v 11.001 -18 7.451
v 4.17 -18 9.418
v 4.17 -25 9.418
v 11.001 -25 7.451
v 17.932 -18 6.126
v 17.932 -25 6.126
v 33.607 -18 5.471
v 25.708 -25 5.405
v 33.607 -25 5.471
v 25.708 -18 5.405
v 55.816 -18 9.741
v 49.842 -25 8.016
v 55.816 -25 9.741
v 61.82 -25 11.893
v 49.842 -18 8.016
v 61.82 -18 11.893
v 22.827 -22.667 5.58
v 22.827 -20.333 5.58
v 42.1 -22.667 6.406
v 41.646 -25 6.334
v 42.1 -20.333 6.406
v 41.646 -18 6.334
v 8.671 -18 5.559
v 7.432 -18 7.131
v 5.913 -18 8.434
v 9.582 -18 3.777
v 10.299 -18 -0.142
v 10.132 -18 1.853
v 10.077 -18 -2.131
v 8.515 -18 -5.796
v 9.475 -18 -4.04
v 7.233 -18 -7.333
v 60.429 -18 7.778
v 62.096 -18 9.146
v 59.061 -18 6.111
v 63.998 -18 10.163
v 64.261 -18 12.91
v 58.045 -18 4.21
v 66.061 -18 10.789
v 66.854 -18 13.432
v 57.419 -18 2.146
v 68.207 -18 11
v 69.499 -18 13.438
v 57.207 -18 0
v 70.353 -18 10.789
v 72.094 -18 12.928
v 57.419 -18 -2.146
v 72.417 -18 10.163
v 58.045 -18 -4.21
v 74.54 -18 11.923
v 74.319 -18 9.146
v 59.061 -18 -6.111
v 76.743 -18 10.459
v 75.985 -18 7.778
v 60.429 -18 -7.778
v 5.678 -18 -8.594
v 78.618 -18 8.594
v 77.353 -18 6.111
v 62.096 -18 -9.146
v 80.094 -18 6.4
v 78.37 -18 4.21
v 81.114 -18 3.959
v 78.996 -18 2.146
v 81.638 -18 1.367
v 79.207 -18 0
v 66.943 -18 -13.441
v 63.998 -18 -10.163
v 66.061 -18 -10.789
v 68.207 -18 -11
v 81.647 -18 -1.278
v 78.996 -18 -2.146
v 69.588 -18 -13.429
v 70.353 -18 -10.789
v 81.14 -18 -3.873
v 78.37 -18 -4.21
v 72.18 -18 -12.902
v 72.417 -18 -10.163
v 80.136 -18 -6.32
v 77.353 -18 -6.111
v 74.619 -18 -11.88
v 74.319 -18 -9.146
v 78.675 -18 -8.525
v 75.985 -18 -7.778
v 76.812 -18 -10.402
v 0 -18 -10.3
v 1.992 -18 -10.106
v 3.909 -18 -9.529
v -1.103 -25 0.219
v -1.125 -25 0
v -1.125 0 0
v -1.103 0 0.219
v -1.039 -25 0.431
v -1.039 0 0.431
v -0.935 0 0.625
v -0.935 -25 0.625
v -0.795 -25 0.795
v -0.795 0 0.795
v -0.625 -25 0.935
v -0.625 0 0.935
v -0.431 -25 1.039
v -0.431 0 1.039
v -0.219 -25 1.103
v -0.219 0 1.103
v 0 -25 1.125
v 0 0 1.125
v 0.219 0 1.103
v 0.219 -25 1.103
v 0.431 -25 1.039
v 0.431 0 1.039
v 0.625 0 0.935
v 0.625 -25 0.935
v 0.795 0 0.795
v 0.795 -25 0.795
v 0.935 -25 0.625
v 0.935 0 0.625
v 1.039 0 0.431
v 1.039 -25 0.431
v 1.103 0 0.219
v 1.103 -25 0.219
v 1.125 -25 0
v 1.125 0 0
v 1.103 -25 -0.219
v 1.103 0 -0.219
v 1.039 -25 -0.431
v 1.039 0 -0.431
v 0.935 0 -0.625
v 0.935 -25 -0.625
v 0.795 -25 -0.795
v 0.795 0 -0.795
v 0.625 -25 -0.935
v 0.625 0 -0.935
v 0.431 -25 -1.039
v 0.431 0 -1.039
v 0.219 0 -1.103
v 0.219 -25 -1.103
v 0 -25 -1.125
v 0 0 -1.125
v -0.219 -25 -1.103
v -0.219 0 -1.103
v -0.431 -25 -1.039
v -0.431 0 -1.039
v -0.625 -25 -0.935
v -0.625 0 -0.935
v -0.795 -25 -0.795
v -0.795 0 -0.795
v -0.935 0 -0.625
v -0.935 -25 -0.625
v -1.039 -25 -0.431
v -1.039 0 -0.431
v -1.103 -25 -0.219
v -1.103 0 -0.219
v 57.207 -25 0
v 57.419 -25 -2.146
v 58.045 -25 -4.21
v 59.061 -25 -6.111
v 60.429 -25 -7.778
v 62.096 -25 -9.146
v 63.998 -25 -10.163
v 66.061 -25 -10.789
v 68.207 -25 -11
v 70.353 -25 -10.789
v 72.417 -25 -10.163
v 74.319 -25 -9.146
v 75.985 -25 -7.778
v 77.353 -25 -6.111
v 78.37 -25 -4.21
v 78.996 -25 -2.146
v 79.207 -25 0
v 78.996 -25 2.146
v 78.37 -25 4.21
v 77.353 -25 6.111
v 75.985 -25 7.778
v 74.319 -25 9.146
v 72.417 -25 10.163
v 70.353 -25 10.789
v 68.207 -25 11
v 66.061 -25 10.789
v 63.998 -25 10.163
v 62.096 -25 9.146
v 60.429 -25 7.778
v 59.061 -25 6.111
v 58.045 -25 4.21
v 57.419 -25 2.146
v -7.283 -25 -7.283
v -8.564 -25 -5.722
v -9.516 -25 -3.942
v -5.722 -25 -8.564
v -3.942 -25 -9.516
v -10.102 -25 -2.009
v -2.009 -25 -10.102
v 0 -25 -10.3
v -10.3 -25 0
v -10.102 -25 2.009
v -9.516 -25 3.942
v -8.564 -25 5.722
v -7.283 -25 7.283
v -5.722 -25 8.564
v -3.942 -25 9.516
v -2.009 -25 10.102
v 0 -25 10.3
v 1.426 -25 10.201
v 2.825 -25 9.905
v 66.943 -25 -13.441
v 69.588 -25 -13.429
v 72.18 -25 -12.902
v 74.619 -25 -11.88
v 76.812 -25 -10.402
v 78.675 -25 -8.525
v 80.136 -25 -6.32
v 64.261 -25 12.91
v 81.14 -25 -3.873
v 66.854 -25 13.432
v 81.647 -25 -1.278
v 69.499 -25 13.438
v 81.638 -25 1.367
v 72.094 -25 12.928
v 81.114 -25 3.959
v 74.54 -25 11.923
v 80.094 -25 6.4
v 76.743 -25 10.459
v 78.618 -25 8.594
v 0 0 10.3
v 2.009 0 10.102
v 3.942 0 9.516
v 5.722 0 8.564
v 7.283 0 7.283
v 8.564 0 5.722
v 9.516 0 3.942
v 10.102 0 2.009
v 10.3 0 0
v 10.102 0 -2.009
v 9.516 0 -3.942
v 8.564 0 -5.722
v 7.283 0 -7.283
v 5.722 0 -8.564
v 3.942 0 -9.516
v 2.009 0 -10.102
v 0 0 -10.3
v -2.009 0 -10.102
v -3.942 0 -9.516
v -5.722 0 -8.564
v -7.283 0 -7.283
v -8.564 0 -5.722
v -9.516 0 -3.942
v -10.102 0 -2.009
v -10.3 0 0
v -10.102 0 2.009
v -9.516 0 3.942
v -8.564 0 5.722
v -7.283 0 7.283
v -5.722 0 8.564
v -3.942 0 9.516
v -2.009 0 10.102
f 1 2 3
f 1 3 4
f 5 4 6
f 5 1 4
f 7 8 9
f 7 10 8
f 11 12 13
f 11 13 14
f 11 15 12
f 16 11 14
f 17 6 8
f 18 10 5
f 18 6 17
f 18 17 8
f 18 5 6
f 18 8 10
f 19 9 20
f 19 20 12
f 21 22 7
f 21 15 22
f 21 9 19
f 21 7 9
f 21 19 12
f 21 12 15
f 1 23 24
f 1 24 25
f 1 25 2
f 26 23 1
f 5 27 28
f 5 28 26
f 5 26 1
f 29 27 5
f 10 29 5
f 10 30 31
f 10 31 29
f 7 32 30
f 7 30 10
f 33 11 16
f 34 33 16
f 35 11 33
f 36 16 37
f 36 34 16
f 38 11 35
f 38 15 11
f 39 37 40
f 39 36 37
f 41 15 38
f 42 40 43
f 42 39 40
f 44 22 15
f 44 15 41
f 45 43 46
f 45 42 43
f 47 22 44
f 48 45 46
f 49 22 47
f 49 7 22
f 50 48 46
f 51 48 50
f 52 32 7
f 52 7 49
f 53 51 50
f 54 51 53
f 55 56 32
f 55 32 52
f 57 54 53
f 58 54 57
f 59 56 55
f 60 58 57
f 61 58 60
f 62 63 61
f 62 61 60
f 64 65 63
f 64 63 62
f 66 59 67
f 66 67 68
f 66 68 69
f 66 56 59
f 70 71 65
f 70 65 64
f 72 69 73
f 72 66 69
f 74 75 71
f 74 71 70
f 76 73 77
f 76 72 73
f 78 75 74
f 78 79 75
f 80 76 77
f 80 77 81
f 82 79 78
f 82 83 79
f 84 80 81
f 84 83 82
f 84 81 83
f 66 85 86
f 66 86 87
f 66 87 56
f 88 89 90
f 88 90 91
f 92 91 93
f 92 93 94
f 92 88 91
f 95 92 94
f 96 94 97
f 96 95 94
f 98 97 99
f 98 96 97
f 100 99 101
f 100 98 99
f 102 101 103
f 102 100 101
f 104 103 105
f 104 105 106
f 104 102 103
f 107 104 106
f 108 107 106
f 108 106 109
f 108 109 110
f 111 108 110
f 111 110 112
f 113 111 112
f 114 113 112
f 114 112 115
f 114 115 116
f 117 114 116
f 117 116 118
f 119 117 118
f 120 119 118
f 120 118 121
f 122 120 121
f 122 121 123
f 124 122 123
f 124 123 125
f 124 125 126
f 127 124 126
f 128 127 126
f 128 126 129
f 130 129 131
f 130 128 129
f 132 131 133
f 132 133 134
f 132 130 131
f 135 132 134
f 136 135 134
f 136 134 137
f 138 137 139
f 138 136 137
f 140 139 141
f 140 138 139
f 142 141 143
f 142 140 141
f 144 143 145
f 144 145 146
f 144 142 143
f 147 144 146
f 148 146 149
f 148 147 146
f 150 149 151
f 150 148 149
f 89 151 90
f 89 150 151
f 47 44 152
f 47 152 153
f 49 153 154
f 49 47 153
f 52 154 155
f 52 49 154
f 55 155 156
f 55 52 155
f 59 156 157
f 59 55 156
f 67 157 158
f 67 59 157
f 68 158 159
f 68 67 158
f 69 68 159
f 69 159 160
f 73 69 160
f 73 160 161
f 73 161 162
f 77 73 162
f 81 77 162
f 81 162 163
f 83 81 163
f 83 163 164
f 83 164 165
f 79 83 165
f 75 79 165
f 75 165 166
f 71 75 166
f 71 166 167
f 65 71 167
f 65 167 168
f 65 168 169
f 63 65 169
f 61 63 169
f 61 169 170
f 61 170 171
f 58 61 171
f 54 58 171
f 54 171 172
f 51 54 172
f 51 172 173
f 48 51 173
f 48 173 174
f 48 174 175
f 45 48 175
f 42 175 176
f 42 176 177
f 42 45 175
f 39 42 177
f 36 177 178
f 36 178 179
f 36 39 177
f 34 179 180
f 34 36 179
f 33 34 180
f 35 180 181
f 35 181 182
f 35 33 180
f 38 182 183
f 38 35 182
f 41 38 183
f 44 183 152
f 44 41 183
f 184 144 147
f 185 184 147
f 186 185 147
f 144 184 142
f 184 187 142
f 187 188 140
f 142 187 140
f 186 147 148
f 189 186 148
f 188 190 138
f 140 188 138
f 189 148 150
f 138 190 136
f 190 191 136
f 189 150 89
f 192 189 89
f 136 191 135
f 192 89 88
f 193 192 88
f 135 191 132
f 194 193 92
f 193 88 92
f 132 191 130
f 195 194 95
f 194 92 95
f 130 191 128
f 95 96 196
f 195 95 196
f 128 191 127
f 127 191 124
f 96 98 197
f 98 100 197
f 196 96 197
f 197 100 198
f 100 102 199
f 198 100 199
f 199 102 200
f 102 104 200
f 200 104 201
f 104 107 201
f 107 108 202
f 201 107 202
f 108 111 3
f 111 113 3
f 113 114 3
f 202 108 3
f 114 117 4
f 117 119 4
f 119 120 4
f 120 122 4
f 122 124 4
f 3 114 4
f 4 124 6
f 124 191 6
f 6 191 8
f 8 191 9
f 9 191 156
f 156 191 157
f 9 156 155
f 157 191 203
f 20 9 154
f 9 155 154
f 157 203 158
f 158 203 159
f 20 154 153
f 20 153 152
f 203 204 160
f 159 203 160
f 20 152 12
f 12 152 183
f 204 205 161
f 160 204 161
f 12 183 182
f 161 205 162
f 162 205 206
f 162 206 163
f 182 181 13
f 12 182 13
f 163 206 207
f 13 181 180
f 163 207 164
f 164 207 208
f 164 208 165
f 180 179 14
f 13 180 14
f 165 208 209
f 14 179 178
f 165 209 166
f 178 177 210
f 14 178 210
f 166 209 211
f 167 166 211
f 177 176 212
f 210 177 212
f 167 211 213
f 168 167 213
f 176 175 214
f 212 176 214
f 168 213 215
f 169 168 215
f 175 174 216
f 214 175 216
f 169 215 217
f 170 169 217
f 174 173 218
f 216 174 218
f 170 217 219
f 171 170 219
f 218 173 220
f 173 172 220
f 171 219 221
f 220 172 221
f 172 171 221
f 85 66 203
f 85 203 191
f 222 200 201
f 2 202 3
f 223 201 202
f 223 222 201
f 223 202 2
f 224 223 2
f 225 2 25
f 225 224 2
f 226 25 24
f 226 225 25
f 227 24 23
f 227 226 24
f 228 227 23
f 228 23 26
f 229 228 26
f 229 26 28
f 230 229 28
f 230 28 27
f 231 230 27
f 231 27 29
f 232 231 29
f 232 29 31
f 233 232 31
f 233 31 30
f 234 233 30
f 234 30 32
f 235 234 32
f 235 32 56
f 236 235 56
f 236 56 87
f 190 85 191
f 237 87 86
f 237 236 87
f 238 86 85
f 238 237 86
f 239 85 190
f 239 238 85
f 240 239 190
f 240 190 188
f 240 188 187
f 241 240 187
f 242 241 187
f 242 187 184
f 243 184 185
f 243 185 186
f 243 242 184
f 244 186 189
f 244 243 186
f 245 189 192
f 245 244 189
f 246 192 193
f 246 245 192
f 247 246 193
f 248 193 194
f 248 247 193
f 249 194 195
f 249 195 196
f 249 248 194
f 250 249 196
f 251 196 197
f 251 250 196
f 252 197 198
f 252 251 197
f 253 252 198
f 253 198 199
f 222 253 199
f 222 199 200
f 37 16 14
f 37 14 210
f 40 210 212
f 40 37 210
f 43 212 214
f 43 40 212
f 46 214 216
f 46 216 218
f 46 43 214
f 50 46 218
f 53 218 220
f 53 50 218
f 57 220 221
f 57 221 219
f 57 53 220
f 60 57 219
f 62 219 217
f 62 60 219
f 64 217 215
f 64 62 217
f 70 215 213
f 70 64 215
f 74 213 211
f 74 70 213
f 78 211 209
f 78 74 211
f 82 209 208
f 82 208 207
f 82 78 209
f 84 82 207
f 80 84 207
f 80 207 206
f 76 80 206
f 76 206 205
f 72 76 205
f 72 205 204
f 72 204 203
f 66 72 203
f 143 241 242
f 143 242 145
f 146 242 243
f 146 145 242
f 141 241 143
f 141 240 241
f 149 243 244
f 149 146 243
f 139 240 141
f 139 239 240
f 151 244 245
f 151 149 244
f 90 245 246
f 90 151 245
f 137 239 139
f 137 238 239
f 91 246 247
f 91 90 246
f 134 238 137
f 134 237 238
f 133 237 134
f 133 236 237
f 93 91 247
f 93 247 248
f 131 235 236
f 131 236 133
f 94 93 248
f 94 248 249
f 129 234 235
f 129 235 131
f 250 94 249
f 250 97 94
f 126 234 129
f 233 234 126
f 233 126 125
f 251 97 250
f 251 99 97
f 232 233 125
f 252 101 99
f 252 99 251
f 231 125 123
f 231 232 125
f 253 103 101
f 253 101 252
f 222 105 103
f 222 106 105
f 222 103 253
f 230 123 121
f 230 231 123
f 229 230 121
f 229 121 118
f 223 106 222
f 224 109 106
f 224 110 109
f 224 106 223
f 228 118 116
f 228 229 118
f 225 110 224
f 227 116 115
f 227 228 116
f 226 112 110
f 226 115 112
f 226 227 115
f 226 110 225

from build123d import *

# Parameters (mm, degrees)
SZKIC1_R                    = 10.3
DODANIE_WYCI_GNI_CIE1_DEPTH = 25
OTWORY_USTALAJ_CE_2_5MM2_D  = 2.25
DODANIE_WYCI_GNI_CIE3_START = -7
DODANIE_WYCI_GNI_CIE3_DEPTH = 7
OTWORY_USTALAJ_CE_2_5MM3_D  = 22


with BuildPart() as part:
    # Szkic1 → Dodanie-wyciągnięcie1 (new body)
    with BuildSketch(Plane(origin=(0, 0, 0), x_dir=(1, 0, 0), z_dir=(0, 1, 0))):
        with Locations(Location((0, 0, 0), (0, 0, 270))):
            Circle(SZKIC1_R)
    extrude(amount=DODANIE_WYCI_GNI_CIE1_DEPTH)

    # Otwory ustalające Ø2.5mm2 (through all)
    with Locations(Plane.XZ):
        with Locations((0, 0)):
            Hole(OTWORY_USTALAJ_CE_2_5MM2_D / 2)

    # Szkic7 → Dodanie-wyciągnięcie3 (add)
    with BuildSketch(Plane(origin=(0, 25, 0), x_dir=(1, 0, 0), z_dir=(0, 1, 0)).offset(DODANIE_WYCI_GNI_CIE3_START)):
        with BuildLine():
            Line((66.943357066, 13.440701035), (0, 10.3))
            ThreePointArc((0, 10.3), (10.077130906, 2.131063748), (4.169904535, -9.418168408))
            add(Edge.make_bspline(
                [(4.169904535, -9.418168408), (22.461776037, -3.24596138), (41.934151815, -4.077243057), (61.820006497, -11.893378905)],
                knots=[0, 0, 0, 0, 1, 1, 1, 1], degree=3))
            ThreePointArc((61.820006497, -11.893378905), (81.439431711, -2.675954354), (66.943357066, 13.440701035))
        make_face()
    extrude(amount=DODANIE_WYCI_GNI_CIE3_DEPTH)

    # Otwory ustalające Ø2.5mm3 (through all)
    with Locations(Plane(origin=(0, 25, 0), x_dir=(1, 0, 0), z_dir=(0, 1, 0))):
        with Locations((68.207301561, 0)):
            Hole(OTWORY_USTALAJ_CE_2_5MM3_D / 2)


with BuildPart() as body_2:
    # Lustro1: mirrored copy
    add(part.part.mirror(Plane.ZX))


solid = body_2.part
